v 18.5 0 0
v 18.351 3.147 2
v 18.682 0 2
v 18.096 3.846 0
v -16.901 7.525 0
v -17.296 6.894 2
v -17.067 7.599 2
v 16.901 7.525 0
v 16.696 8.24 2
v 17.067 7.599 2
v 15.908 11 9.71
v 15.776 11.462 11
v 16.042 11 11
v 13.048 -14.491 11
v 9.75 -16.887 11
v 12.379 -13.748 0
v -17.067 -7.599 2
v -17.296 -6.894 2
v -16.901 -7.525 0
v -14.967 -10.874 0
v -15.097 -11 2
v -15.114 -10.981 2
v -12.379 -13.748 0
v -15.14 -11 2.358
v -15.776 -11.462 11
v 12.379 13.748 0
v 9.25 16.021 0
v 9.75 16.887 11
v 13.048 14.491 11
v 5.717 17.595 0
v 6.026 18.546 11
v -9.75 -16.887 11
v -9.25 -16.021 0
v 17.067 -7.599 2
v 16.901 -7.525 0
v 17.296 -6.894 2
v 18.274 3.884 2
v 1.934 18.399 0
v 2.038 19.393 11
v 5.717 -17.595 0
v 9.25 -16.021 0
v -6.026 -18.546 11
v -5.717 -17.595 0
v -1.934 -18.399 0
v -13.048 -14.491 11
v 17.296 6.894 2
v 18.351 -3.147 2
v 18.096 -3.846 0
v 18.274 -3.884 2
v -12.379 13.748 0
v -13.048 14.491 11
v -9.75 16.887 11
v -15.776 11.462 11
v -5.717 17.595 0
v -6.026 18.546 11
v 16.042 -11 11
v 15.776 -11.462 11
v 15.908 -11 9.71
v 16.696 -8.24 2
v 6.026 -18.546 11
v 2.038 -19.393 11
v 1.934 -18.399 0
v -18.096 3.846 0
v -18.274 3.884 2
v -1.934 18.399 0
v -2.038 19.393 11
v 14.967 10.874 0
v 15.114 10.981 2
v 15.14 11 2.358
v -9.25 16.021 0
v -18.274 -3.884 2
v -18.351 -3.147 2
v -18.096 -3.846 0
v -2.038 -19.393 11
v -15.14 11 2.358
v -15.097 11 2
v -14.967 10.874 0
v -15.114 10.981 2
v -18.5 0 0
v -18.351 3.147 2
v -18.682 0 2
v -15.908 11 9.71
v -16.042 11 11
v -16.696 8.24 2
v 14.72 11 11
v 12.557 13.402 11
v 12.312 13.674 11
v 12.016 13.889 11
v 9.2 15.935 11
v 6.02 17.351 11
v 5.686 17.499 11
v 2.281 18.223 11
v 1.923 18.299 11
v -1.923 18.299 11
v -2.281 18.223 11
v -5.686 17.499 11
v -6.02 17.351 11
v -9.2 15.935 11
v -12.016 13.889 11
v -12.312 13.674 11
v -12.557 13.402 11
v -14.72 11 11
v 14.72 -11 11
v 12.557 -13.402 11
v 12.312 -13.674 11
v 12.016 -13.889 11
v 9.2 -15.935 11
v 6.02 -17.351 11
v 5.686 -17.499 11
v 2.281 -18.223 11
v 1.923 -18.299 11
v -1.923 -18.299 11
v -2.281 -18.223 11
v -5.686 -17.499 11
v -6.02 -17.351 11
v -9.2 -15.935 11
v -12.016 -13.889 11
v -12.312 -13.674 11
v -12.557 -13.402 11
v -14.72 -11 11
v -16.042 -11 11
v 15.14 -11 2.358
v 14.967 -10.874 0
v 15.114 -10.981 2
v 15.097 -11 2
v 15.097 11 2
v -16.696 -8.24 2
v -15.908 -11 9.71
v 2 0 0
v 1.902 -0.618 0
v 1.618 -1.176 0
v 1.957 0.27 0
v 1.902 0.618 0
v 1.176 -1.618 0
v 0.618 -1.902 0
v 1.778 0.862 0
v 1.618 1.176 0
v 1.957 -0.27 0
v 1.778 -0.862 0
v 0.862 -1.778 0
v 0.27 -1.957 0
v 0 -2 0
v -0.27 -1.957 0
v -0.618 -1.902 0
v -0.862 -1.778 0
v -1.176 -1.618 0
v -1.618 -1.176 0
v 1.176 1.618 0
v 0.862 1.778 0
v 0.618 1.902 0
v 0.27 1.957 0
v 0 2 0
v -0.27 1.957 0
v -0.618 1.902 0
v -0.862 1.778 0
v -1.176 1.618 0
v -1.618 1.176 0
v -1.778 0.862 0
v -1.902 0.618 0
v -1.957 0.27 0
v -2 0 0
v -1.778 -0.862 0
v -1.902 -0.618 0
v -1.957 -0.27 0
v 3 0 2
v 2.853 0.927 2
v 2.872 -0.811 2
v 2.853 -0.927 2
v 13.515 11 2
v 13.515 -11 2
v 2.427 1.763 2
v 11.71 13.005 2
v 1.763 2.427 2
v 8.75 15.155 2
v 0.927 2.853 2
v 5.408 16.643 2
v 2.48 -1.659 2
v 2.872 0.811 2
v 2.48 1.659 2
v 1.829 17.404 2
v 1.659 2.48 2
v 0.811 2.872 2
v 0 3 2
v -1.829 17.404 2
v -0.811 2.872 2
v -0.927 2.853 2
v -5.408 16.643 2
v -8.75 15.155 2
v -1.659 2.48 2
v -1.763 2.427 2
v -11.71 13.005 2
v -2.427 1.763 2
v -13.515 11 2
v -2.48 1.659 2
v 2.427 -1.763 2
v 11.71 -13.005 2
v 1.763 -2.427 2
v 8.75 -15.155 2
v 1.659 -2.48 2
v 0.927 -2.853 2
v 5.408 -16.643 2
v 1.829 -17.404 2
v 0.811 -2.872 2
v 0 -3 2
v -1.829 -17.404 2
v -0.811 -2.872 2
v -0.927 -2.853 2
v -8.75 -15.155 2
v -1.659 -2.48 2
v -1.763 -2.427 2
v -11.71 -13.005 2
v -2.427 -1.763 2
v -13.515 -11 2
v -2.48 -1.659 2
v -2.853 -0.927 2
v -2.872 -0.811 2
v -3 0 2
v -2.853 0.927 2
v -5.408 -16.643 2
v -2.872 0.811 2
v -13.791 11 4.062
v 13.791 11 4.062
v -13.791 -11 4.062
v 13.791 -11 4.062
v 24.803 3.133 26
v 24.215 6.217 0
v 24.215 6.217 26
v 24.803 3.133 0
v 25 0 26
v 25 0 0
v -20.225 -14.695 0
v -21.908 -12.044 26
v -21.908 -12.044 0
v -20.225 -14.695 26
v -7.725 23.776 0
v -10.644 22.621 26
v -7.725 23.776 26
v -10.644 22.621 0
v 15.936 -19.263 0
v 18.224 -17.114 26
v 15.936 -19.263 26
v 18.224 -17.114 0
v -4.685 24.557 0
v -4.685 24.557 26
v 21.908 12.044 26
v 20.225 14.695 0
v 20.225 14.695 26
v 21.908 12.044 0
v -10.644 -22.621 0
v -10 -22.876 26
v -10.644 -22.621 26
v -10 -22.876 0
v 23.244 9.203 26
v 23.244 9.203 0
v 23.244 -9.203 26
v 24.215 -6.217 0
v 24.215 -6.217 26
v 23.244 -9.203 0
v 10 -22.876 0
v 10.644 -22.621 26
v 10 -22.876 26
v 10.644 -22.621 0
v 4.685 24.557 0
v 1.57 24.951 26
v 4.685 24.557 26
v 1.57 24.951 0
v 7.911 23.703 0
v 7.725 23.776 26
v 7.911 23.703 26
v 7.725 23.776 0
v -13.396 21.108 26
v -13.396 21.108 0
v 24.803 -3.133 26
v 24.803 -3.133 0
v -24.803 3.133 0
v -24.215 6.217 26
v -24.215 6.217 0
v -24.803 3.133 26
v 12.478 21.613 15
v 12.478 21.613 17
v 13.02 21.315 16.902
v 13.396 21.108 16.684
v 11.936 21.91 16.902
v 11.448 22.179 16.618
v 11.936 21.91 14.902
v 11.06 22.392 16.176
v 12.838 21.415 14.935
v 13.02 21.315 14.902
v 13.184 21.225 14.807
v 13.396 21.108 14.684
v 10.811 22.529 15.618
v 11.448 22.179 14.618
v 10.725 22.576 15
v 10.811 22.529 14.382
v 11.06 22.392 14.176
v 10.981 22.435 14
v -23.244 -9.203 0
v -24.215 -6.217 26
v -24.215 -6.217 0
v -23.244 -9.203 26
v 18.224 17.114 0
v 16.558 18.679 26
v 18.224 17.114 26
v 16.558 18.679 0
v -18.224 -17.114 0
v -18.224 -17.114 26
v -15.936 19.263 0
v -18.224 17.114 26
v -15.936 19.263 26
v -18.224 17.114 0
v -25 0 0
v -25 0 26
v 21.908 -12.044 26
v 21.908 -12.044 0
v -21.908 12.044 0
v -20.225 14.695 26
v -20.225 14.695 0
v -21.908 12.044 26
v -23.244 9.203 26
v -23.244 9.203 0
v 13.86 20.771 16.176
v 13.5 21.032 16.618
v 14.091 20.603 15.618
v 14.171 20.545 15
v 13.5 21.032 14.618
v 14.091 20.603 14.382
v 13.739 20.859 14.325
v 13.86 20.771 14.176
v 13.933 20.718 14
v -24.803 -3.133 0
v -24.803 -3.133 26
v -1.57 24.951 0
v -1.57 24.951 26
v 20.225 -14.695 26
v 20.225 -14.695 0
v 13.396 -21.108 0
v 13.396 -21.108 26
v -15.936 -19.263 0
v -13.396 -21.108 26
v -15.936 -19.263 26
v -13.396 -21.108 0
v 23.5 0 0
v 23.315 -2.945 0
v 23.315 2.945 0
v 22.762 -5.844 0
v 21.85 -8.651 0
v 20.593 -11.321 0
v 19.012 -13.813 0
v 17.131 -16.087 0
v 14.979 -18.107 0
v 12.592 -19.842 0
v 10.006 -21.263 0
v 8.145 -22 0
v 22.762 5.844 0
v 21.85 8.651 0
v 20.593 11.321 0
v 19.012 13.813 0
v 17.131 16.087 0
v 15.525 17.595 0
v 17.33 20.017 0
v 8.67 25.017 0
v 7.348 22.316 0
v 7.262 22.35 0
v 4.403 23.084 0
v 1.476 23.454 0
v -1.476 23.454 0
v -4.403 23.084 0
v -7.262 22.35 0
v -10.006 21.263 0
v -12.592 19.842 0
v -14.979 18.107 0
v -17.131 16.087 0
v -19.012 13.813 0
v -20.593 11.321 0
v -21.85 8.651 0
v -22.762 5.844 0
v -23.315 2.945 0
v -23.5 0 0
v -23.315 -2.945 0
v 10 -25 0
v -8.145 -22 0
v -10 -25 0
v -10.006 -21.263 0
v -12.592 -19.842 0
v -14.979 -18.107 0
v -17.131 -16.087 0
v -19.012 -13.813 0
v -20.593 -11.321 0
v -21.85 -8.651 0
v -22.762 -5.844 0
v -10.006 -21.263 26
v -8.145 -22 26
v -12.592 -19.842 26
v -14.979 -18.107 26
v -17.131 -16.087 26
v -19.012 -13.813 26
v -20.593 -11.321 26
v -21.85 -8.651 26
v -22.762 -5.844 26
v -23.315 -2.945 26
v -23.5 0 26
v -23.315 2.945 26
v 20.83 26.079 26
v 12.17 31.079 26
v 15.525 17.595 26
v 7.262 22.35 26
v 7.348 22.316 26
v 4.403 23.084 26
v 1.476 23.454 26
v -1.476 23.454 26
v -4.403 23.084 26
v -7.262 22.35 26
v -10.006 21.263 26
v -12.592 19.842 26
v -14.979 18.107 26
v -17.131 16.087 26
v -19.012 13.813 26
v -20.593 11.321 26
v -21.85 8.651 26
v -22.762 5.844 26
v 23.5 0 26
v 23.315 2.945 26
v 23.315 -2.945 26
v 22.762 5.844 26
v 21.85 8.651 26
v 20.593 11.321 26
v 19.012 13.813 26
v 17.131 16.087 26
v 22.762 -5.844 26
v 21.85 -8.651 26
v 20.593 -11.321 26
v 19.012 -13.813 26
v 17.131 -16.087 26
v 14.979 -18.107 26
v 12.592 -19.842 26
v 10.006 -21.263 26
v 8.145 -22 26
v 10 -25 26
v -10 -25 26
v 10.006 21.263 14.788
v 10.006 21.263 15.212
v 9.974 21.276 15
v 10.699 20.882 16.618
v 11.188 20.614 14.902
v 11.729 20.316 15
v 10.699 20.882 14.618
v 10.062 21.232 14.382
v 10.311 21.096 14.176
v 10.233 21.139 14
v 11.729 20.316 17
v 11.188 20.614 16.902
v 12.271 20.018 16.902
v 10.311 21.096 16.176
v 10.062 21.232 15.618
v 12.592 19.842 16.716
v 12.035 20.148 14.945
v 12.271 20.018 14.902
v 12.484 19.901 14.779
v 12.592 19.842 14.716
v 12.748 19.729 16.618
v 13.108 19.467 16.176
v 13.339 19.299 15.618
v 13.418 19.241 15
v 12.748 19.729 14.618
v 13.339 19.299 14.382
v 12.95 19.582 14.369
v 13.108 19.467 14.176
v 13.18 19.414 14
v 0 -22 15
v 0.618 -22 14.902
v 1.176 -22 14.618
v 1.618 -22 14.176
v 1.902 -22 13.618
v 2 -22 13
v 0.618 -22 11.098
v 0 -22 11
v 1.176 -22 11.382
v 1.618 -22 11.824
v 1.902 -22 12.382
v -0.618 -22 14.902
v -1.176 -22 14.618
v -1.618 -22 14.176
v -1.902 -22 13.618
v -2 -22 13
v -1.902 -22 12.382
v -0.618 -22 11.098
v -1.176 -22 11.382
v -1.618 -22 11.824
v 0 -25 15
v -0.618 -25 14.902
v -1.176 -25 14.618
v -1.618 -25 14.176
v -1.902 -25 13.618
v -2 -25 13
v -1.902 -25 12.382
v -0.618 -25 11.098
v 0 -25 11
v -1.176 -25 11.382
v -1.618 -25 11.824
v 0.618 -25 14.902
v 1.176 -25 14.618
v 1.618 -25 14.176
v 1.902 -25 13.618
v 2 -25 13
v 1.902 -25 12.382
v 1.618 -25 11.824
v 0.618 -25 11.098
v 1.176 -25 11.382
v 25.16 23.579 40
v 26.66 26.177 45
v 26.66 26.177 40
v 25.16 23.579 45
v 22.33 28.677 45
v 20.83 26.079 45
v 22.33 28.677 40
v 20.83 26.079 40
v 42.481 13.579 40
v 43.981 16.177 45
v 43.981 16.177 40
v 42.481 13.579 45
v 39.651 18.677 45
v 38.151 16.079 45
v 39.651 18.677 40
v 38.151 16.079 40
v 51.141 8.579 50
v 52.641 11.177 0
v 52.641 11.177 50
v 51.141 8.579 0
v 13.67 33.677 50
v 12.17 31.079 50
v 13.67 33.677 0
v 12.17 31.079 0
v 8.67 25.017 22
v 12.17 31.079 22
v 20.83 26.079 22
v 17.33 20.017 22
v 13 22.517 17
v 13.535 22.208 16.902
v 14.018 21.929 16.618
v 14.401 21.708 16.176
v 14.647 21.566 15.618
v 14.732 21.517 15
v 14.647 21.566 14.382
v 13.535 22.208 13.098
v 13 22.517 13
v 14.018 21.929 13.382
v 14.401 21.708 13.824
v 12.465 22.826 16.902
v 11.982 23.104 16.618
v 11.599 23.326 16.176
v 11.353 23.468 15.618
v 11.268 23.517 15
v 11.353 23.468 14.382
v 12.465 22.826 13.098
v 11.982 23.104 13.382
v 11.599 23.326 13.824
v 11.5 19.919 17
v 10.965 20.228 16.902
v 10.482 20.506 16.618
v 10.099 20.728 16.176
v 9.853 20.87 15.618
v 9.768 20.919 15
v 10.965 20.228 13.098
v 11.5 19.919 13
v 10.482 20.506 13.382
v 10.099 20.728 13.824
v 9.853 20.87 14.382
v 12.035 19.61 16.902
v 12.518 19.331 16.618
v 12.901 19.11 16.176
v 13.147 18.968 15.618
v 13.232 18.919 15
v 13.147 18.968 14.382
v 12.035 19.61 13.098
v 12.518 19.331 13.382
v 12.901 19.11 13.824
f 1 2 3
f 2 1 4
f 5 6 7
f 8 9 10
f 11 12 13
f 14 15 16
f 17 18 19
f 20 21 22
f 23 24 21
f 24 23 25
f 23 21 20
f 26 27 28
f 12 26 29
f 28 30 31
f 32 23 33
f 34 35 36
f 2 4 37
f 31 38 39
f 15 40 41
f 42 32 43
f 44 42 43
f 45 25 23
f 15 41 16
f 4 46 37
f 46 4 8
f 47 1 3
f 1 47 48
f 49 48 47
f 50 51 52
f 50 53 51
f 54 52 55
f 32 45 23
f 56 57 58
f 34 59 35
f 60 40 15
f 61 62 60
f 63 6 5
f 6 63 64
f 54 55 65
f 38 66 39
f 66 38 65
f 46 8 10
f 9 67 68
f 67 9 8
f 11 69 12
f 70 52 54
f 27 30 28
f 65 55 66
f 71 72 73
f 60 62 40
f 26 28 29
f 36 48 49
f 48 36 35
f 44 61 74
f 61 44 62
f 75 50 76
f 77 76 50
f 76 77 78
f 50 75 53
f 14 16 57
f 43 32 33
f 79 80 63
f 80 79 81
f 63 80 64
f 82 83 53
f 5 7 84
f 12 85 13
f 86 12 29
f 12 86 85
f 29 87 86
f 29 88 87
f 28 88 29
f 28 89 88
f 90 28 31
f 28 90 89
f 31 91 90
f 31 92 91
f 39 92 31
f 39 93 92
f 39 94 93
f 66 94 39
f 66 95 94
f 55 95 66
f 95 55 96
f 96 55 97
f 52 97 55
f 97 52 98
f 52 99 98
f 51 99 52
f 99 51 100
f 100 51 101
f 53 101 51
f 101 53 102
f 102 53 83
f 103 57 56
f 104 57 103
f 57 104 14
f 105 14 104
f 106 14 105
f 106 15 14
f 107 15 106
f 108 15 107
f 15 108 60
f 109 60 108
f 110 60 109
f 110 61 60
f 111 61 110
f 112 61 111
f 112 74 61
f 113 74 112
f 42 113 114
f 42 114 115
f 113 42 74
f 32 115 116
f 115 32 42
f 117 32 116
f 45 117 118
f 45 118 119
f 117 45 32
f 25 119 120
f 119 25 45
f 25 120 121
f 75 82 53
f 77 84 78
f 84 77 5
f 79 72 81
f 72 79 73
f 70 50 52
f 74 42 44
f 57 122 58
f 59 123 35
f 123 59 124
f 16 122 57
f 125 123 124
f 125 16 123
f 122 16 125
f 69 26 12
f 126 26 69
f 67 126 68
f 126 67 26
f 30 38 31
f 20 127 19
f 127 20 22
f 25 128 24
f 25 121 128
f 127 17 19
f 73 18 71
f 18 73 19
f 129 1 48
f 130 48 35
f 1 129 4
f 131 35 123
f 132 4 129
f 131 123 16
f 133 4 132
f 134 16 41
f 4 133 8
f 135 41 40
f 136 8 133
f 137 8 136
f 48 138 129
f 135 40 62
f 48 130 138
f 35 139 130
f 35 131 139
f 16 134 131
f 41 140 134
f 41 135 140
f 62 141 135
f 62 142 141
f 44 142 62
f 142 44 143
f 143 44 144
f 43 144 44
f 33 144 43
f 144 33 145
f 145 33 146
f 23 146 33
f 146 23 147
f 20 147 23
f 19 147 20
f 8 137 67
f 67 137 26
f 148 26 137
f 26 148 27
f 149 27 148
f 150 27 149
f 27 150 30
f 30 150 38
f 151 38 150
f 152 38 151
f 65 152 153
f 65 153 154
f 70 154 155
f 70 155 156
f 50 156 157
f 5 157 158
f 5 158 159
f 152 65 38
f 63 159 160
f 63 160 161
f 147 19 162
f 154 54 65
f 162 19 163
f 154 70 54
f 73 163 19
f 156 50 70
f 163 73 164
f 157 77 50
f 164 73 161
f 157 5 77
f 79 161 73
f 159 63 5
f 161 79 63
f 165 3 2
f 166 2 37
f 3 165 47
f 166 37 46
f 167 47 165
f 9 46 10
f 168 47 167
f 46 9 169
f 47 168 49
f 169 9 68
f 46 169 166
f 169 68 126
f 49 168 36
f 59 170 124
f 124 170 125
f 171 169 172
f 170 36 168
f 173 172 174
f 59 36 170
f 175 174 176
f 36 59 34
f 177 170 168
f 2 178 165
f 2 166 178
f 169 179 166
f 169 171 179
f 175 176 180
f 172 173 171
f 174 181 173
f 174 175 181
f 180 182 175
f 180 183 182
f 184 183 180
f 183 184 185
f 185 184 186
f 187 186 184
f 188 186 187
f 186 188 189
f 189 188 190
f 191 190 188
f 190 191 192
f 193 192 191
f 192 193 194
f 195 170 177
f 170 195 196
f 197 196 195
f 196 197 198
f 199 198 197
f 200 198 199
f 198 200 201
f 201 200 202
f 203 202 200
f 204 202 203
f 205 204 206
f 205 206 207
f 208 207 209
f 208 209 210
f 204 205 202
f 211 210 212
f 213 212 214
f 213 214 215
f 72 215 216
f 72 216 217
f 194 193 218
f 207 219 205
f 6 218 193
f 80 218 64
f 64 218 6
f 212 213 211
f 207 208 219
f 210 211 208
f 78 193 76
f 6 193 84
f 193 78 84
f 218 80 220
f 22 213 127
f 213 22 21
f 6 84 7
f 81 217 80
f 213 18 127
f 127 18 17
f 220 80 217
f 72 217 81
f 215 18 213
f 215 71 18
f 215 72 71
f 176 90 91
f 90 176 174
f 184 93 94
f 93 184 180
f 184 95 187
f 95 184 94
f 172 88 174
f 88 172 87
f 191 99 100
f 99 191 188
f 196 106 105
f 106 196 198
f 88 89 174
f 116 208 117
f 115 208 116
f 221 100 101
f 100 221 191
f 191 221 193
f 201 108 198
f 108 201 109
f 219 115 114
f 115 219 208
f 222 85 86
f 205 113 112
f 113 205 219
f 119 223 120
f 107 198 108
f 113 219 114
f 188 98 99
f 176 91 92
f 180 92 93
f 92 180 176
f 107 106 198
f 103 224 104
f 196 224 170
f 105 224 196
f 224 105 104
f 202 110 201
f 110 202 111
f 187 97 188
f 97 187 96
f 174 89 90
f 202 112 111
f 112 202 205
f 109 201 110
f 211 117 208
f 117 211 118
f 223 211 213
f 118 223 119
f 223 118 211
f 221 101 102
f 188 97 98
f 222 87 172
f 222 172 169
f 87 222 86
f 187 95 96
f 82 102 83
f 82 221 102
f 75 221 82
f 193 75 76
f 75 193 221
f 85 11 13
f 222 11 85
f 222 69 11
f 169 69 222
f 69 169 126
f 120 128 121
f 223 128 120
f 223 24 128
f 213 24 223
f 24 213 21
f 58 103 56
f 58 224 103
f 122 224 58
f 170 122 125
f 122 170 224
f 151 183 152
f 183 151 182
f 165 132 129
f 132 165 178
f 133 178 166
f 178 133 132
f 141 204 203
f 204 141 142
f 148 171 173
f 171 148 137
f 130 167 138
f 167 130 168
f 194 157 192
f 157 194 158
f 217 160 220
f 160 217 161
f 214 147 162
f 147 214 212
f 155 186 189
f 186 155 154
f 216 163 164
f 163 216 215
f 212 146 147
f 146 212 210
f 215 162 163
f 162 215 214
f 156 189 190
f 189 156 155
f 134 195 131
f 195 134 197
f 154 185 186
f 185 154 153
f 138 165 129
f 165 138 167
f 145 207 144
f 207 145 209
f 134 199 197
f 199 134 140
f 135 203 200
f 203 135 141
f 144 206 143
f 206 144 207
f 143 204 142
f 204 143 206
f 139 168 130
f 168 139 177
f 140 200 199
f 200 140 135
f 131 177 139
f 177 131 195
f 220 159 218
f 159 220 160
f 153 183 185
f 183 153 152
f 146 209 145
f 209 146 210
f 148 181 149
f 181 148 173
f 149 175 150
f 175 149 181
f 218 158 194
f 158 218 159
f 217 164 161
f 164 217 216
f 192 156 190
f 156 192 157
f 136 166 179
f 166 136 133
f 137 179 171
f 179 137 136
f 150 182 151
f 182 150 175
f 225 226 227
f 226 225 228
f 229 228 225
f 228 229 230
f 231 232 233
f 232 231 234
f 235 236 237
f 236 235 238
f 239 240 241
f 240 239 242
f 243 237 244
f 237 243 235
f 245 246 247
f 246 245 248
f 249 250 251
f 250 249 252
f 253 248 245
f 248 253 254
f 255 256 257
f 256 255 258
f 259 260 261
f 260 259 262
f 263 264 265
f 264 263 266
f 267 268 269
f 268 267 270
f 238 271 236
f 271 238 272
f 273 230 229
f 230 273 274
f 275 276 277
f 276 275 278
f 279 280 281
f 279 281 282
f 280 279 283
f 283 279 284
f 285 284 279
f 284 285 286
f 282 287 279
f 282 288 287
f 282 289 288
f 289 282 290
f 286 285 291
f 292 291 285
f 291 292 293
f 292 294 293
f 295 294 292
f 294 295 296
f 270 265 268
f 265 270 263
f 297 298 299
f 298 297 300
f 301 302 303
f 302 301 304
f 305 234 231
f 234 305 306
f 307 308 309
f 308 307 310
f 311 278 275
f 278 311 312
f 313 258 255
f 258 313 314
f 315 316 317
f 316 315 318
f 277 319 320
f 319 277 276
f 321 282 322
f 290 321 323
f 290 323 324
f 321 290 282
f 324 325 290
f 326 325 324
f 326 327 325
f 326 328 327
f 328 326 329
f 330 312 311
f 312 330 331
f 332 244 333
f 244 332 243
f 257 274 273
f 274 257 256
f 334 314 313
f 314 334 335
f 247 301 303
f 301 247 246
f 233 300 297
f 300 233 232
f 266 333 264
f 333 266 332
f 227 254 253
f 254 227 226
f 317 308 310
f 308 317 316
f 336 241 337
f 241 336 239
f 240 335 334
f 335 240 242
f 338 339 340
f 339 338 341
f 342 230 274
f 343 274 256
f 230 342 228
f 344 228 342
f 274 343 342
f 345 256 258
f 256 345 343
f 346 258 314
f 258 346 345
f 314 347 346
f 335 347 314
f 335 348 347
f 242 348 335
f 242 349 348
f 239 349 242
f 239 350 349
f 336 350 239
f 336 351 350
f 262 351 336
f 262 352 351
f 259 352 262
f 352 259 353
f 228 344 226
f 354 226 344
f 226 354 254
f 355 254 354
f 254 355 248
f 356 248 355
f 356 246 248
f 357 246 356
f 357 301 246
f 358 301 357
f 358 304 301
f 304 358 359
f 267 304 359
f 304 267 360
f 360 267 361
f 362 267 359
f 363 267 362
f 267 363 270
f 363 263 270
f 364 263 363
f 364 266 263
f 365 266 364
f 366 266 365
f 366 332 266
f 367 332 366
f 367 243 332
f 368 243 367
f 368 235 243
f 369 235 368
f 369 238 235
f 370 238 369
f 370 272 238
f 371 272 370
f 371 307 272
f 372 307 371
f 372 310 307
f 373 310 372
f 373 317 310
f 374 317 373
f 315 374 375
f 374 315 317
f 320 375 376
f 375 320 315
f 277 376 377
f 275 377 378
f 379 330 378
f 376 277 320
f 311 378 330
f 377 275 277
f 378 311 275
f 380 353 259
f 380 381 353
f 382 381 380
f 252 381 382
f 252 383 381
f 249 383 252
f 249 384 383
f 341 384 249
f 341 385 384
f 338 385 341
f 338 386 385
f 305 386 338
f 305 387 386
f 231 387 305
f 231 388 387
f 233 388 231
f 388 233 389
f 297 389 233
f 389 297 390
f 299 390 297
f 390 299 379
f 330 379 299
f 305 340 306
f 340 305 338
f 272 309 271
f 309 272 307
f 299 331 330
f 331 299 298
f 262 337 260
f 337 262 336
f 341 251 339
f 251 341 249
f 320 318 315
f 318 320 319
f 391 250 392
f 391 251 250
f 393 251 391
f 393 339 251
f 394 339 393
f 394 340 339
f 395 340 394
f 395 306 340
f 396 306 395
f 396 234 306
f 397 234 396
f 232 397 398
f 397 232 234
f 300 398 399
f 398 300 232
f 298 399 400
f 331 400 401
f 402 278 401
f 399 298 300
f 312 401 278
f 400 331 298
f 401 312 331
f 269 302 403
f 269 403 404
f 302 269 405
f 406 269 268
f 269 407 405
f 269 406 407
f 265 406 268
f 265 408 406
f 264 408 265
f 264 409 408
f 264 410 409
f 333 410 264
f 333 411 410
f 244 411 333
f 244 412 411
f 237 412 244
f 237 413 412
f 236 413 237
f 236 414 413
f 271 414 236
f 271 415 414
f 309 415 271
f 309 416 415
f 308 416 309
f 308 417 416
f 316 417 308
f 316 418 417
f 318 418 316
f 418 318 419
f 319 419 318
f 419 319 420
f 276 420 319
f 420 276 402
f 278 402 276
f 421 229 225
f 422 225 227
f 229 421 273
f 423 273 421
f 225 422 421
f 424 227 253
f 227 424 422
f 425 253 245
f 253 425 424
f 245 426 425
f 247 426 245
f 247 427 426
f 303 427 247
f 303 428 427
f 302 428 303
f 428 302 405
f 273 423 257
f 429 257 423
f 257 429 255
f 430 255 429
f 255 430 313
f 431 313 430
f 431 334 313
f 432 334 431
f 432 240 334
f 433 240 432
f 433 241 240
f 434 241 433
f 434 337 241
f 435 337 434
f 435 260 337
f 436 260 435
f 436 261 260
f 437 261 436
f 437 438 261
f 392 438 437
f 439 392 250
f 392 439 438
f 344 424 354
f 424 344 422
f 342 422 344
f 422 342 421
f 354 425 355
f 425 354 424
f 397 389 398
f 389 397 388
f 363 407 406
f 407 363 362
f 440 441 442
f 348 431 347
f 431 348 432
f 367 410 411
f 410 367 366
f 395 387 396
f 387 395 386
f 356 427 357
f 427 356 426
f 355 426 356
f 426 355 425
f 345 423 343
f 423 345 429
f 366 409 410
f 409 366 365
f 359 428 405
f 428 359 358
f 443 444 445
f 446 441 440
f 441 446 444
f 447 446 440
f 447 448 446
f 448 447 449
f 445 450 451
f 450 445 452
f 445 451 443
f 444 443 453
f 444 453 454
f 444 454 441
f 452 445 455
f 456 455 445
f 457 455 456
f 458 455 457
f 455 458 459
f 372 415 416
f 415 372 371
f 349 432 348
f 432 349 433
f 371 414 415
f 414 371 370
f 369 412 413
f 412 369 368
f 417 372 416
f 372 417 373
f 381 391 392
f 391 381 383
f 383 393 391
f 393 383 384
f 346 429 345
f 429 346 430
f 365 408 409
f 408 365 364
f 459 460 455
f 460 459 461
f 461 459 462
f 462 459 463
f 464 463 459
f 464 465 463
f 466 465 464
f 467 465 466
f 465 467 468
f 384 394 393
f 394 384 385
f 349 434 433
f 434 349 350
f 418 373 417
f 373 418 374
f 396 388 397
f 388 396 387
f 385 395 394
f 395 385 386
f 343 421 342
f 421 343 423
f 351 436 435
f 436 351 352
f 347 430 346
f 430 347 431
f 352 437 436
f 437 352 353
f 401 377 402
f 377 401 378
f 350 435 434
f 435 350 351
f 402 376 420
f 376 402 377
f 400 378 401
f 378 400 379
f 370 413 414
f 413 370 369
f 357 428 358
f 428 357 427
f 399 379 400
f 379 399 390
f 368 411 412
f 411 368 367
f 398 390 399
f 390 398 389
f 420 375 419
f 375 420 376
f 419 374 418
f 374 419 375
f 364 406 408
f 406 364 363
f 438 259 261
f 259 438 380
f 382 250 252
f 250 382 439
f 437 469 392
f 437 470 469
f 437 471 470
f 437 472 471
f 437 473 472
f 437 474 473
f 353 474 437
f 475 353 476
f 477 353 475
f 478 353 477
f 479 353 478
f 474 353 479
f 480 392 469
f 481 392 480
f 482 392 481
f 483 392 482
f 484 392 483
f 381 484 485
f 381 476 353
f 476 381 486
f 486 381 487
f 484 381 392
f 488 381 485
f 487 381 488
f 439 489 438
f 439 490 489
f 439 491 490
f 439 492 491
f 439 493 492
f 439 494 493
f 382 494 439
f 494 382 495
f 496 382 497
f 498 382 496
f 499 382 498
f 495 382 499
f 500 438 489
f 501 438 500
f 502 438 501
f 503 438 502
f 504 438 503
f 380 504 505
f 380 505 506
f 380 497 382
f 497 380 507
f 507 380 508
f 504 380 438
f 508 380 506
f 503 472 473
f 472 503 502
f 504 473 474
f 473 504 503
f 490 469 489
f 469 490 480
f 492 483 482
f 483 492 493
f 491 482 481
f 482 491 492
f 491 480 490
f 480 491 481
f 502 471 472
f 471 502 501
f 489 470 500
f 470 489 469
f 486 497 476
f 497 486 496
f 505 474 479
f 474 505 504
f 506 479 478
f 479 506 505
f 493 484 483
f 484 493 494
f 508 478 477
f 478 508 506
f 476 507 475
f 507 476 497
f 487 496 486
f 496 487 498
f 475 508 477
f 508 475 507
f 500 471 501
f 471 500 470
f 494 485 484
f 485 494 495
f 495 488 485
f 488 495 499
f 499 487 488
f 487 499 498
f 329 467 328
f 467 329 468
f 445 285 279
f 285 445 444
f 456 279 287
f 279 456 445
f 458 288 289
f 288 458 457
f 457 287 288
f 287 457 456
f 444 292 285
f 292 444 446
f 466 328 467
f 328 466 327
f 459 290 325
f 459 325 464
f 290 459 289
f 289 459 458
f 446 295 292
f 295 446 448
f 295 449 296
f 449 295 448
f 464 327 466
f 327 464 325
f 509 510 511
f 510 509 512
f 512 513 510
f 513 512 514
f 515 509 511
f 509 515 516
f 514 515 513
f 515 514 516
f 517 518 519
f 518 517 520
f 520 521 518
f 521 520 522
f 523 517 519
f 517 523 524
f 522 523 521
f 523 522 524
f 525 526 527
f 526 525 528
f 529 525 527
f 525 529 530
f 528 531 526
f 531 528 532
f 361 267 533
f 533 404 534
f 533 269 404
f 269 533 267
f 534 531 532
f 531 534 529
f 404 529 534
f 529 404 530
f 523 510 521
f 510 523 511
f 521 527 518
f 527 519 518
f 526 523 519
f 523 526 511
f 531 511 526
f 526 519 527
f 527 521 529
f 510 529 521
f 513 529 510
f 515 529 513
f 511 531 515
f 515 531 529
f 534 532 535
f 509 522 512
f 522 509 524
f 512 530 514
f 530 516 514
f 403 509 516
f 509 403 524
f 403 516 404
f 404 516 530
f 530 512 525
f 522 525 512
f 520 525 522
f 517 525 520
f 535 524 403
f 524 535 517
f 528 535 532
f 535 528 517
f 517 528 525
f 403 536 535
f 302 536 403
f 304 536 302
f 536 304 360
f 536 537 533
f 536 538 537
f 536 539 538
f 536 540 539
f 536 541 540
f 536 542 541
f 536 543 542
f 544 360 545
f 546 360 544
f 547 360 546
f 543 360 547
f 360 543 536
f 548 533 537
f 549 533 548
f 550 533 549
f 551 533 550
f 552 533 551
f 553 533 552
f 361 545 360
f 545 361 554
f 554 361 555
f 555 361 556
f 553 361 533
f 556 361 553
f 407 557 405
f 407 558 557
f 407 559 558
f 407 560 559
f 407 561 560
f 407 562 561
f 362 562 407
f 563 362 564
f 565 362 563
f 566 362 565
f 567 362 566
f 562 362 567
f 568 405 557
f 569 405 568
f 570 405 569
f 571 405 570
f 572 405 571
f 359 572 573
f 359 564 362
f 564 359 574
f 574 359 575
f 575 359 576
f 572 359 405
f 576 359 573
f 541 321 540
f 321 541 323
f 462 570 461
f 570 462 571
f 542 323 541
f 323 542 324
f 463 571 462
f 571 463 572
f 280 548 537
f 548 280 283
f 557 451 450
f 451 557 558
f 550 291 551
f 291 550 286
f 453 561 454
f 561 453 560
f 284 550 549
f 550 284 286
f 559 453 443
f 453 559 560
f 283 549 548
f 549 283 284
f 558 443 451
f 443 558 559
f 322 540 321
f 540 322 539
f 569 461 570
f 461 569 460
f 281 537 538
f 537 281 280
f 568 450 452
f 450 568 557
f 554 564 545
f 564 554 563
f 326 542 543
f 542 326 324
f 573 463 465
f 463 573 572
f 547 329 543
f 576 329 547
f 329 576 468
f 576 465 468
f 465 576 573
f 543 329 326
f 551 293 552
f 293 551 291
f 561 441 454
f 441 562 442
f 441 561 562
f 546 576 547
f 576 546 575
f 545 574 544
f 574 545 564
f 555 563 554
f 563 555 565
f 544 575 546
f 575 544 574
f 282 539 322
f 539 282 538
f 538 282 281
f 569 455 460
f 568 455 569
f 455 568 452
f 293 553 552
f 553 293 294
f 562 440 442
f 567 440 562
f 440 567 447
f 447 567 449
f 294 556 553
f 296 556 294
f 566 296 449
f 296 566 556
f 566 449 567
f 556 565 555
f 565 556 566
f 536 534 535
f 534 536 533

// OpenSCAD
//Soporte cargadores: Teléfono, Reloj, Auriculares
//Parte1 reloj base cargador esfera
difference(){
    difference(){
        difference(){
            cylinder(h=11,r1=37/2, r2=39/2, $fn=30);
            translate([0,0,2])
                cylinder(h=10,r1=35/2, r2=37/2, $fn=30);
        }
        translate([-20,-11,2])
            cube([40, 22, 15]);
    }
    translate([0,0,-1])
        cylinder(h=4,r1=3/2,r2=7/2,$fn=20);
}
//Parte2 reloj pulsera
difference(){
    difference(){
        union(){
            difference(){
                cylinder(h=26,r=50/2,$fn=50);
                translate([0,0,-1])
                    cylinder(h=32,r=47/2,$fn=50);
            }
            translate([-20/2,-25,0])
                cube([20,3,26]);
        }    
        rotate([90,0,0])
            translate([0,13,15])
                cylinder(h=20,r=4/2,$fn=20);
    }
    rotate([90,0,-30])
    translate([0,13,-30])
        cylinder(h=15, r=4/2, $fn=20);
}
//Parte3 reloj soporte
rotate([0,0,-30]){
    translate([-5,33,0])
        difference(){
            cube([45,3,50]);
            union(){
                translate([10,-1,40])
                    cube([5,5,5]);
                translate([30,-1,40])
                    cube([5,5,5]);
            }
        }
    translate([-5,23,0]){
        translate([0,0,22])
            cube([10,10,4]);
        difference(){
            cube([10,3,26]);
            translate([5,5,15])
                rotate([90,0,0])
                    cylinder(h=10, r=4/2,$fn=20);
        }
    }
}
